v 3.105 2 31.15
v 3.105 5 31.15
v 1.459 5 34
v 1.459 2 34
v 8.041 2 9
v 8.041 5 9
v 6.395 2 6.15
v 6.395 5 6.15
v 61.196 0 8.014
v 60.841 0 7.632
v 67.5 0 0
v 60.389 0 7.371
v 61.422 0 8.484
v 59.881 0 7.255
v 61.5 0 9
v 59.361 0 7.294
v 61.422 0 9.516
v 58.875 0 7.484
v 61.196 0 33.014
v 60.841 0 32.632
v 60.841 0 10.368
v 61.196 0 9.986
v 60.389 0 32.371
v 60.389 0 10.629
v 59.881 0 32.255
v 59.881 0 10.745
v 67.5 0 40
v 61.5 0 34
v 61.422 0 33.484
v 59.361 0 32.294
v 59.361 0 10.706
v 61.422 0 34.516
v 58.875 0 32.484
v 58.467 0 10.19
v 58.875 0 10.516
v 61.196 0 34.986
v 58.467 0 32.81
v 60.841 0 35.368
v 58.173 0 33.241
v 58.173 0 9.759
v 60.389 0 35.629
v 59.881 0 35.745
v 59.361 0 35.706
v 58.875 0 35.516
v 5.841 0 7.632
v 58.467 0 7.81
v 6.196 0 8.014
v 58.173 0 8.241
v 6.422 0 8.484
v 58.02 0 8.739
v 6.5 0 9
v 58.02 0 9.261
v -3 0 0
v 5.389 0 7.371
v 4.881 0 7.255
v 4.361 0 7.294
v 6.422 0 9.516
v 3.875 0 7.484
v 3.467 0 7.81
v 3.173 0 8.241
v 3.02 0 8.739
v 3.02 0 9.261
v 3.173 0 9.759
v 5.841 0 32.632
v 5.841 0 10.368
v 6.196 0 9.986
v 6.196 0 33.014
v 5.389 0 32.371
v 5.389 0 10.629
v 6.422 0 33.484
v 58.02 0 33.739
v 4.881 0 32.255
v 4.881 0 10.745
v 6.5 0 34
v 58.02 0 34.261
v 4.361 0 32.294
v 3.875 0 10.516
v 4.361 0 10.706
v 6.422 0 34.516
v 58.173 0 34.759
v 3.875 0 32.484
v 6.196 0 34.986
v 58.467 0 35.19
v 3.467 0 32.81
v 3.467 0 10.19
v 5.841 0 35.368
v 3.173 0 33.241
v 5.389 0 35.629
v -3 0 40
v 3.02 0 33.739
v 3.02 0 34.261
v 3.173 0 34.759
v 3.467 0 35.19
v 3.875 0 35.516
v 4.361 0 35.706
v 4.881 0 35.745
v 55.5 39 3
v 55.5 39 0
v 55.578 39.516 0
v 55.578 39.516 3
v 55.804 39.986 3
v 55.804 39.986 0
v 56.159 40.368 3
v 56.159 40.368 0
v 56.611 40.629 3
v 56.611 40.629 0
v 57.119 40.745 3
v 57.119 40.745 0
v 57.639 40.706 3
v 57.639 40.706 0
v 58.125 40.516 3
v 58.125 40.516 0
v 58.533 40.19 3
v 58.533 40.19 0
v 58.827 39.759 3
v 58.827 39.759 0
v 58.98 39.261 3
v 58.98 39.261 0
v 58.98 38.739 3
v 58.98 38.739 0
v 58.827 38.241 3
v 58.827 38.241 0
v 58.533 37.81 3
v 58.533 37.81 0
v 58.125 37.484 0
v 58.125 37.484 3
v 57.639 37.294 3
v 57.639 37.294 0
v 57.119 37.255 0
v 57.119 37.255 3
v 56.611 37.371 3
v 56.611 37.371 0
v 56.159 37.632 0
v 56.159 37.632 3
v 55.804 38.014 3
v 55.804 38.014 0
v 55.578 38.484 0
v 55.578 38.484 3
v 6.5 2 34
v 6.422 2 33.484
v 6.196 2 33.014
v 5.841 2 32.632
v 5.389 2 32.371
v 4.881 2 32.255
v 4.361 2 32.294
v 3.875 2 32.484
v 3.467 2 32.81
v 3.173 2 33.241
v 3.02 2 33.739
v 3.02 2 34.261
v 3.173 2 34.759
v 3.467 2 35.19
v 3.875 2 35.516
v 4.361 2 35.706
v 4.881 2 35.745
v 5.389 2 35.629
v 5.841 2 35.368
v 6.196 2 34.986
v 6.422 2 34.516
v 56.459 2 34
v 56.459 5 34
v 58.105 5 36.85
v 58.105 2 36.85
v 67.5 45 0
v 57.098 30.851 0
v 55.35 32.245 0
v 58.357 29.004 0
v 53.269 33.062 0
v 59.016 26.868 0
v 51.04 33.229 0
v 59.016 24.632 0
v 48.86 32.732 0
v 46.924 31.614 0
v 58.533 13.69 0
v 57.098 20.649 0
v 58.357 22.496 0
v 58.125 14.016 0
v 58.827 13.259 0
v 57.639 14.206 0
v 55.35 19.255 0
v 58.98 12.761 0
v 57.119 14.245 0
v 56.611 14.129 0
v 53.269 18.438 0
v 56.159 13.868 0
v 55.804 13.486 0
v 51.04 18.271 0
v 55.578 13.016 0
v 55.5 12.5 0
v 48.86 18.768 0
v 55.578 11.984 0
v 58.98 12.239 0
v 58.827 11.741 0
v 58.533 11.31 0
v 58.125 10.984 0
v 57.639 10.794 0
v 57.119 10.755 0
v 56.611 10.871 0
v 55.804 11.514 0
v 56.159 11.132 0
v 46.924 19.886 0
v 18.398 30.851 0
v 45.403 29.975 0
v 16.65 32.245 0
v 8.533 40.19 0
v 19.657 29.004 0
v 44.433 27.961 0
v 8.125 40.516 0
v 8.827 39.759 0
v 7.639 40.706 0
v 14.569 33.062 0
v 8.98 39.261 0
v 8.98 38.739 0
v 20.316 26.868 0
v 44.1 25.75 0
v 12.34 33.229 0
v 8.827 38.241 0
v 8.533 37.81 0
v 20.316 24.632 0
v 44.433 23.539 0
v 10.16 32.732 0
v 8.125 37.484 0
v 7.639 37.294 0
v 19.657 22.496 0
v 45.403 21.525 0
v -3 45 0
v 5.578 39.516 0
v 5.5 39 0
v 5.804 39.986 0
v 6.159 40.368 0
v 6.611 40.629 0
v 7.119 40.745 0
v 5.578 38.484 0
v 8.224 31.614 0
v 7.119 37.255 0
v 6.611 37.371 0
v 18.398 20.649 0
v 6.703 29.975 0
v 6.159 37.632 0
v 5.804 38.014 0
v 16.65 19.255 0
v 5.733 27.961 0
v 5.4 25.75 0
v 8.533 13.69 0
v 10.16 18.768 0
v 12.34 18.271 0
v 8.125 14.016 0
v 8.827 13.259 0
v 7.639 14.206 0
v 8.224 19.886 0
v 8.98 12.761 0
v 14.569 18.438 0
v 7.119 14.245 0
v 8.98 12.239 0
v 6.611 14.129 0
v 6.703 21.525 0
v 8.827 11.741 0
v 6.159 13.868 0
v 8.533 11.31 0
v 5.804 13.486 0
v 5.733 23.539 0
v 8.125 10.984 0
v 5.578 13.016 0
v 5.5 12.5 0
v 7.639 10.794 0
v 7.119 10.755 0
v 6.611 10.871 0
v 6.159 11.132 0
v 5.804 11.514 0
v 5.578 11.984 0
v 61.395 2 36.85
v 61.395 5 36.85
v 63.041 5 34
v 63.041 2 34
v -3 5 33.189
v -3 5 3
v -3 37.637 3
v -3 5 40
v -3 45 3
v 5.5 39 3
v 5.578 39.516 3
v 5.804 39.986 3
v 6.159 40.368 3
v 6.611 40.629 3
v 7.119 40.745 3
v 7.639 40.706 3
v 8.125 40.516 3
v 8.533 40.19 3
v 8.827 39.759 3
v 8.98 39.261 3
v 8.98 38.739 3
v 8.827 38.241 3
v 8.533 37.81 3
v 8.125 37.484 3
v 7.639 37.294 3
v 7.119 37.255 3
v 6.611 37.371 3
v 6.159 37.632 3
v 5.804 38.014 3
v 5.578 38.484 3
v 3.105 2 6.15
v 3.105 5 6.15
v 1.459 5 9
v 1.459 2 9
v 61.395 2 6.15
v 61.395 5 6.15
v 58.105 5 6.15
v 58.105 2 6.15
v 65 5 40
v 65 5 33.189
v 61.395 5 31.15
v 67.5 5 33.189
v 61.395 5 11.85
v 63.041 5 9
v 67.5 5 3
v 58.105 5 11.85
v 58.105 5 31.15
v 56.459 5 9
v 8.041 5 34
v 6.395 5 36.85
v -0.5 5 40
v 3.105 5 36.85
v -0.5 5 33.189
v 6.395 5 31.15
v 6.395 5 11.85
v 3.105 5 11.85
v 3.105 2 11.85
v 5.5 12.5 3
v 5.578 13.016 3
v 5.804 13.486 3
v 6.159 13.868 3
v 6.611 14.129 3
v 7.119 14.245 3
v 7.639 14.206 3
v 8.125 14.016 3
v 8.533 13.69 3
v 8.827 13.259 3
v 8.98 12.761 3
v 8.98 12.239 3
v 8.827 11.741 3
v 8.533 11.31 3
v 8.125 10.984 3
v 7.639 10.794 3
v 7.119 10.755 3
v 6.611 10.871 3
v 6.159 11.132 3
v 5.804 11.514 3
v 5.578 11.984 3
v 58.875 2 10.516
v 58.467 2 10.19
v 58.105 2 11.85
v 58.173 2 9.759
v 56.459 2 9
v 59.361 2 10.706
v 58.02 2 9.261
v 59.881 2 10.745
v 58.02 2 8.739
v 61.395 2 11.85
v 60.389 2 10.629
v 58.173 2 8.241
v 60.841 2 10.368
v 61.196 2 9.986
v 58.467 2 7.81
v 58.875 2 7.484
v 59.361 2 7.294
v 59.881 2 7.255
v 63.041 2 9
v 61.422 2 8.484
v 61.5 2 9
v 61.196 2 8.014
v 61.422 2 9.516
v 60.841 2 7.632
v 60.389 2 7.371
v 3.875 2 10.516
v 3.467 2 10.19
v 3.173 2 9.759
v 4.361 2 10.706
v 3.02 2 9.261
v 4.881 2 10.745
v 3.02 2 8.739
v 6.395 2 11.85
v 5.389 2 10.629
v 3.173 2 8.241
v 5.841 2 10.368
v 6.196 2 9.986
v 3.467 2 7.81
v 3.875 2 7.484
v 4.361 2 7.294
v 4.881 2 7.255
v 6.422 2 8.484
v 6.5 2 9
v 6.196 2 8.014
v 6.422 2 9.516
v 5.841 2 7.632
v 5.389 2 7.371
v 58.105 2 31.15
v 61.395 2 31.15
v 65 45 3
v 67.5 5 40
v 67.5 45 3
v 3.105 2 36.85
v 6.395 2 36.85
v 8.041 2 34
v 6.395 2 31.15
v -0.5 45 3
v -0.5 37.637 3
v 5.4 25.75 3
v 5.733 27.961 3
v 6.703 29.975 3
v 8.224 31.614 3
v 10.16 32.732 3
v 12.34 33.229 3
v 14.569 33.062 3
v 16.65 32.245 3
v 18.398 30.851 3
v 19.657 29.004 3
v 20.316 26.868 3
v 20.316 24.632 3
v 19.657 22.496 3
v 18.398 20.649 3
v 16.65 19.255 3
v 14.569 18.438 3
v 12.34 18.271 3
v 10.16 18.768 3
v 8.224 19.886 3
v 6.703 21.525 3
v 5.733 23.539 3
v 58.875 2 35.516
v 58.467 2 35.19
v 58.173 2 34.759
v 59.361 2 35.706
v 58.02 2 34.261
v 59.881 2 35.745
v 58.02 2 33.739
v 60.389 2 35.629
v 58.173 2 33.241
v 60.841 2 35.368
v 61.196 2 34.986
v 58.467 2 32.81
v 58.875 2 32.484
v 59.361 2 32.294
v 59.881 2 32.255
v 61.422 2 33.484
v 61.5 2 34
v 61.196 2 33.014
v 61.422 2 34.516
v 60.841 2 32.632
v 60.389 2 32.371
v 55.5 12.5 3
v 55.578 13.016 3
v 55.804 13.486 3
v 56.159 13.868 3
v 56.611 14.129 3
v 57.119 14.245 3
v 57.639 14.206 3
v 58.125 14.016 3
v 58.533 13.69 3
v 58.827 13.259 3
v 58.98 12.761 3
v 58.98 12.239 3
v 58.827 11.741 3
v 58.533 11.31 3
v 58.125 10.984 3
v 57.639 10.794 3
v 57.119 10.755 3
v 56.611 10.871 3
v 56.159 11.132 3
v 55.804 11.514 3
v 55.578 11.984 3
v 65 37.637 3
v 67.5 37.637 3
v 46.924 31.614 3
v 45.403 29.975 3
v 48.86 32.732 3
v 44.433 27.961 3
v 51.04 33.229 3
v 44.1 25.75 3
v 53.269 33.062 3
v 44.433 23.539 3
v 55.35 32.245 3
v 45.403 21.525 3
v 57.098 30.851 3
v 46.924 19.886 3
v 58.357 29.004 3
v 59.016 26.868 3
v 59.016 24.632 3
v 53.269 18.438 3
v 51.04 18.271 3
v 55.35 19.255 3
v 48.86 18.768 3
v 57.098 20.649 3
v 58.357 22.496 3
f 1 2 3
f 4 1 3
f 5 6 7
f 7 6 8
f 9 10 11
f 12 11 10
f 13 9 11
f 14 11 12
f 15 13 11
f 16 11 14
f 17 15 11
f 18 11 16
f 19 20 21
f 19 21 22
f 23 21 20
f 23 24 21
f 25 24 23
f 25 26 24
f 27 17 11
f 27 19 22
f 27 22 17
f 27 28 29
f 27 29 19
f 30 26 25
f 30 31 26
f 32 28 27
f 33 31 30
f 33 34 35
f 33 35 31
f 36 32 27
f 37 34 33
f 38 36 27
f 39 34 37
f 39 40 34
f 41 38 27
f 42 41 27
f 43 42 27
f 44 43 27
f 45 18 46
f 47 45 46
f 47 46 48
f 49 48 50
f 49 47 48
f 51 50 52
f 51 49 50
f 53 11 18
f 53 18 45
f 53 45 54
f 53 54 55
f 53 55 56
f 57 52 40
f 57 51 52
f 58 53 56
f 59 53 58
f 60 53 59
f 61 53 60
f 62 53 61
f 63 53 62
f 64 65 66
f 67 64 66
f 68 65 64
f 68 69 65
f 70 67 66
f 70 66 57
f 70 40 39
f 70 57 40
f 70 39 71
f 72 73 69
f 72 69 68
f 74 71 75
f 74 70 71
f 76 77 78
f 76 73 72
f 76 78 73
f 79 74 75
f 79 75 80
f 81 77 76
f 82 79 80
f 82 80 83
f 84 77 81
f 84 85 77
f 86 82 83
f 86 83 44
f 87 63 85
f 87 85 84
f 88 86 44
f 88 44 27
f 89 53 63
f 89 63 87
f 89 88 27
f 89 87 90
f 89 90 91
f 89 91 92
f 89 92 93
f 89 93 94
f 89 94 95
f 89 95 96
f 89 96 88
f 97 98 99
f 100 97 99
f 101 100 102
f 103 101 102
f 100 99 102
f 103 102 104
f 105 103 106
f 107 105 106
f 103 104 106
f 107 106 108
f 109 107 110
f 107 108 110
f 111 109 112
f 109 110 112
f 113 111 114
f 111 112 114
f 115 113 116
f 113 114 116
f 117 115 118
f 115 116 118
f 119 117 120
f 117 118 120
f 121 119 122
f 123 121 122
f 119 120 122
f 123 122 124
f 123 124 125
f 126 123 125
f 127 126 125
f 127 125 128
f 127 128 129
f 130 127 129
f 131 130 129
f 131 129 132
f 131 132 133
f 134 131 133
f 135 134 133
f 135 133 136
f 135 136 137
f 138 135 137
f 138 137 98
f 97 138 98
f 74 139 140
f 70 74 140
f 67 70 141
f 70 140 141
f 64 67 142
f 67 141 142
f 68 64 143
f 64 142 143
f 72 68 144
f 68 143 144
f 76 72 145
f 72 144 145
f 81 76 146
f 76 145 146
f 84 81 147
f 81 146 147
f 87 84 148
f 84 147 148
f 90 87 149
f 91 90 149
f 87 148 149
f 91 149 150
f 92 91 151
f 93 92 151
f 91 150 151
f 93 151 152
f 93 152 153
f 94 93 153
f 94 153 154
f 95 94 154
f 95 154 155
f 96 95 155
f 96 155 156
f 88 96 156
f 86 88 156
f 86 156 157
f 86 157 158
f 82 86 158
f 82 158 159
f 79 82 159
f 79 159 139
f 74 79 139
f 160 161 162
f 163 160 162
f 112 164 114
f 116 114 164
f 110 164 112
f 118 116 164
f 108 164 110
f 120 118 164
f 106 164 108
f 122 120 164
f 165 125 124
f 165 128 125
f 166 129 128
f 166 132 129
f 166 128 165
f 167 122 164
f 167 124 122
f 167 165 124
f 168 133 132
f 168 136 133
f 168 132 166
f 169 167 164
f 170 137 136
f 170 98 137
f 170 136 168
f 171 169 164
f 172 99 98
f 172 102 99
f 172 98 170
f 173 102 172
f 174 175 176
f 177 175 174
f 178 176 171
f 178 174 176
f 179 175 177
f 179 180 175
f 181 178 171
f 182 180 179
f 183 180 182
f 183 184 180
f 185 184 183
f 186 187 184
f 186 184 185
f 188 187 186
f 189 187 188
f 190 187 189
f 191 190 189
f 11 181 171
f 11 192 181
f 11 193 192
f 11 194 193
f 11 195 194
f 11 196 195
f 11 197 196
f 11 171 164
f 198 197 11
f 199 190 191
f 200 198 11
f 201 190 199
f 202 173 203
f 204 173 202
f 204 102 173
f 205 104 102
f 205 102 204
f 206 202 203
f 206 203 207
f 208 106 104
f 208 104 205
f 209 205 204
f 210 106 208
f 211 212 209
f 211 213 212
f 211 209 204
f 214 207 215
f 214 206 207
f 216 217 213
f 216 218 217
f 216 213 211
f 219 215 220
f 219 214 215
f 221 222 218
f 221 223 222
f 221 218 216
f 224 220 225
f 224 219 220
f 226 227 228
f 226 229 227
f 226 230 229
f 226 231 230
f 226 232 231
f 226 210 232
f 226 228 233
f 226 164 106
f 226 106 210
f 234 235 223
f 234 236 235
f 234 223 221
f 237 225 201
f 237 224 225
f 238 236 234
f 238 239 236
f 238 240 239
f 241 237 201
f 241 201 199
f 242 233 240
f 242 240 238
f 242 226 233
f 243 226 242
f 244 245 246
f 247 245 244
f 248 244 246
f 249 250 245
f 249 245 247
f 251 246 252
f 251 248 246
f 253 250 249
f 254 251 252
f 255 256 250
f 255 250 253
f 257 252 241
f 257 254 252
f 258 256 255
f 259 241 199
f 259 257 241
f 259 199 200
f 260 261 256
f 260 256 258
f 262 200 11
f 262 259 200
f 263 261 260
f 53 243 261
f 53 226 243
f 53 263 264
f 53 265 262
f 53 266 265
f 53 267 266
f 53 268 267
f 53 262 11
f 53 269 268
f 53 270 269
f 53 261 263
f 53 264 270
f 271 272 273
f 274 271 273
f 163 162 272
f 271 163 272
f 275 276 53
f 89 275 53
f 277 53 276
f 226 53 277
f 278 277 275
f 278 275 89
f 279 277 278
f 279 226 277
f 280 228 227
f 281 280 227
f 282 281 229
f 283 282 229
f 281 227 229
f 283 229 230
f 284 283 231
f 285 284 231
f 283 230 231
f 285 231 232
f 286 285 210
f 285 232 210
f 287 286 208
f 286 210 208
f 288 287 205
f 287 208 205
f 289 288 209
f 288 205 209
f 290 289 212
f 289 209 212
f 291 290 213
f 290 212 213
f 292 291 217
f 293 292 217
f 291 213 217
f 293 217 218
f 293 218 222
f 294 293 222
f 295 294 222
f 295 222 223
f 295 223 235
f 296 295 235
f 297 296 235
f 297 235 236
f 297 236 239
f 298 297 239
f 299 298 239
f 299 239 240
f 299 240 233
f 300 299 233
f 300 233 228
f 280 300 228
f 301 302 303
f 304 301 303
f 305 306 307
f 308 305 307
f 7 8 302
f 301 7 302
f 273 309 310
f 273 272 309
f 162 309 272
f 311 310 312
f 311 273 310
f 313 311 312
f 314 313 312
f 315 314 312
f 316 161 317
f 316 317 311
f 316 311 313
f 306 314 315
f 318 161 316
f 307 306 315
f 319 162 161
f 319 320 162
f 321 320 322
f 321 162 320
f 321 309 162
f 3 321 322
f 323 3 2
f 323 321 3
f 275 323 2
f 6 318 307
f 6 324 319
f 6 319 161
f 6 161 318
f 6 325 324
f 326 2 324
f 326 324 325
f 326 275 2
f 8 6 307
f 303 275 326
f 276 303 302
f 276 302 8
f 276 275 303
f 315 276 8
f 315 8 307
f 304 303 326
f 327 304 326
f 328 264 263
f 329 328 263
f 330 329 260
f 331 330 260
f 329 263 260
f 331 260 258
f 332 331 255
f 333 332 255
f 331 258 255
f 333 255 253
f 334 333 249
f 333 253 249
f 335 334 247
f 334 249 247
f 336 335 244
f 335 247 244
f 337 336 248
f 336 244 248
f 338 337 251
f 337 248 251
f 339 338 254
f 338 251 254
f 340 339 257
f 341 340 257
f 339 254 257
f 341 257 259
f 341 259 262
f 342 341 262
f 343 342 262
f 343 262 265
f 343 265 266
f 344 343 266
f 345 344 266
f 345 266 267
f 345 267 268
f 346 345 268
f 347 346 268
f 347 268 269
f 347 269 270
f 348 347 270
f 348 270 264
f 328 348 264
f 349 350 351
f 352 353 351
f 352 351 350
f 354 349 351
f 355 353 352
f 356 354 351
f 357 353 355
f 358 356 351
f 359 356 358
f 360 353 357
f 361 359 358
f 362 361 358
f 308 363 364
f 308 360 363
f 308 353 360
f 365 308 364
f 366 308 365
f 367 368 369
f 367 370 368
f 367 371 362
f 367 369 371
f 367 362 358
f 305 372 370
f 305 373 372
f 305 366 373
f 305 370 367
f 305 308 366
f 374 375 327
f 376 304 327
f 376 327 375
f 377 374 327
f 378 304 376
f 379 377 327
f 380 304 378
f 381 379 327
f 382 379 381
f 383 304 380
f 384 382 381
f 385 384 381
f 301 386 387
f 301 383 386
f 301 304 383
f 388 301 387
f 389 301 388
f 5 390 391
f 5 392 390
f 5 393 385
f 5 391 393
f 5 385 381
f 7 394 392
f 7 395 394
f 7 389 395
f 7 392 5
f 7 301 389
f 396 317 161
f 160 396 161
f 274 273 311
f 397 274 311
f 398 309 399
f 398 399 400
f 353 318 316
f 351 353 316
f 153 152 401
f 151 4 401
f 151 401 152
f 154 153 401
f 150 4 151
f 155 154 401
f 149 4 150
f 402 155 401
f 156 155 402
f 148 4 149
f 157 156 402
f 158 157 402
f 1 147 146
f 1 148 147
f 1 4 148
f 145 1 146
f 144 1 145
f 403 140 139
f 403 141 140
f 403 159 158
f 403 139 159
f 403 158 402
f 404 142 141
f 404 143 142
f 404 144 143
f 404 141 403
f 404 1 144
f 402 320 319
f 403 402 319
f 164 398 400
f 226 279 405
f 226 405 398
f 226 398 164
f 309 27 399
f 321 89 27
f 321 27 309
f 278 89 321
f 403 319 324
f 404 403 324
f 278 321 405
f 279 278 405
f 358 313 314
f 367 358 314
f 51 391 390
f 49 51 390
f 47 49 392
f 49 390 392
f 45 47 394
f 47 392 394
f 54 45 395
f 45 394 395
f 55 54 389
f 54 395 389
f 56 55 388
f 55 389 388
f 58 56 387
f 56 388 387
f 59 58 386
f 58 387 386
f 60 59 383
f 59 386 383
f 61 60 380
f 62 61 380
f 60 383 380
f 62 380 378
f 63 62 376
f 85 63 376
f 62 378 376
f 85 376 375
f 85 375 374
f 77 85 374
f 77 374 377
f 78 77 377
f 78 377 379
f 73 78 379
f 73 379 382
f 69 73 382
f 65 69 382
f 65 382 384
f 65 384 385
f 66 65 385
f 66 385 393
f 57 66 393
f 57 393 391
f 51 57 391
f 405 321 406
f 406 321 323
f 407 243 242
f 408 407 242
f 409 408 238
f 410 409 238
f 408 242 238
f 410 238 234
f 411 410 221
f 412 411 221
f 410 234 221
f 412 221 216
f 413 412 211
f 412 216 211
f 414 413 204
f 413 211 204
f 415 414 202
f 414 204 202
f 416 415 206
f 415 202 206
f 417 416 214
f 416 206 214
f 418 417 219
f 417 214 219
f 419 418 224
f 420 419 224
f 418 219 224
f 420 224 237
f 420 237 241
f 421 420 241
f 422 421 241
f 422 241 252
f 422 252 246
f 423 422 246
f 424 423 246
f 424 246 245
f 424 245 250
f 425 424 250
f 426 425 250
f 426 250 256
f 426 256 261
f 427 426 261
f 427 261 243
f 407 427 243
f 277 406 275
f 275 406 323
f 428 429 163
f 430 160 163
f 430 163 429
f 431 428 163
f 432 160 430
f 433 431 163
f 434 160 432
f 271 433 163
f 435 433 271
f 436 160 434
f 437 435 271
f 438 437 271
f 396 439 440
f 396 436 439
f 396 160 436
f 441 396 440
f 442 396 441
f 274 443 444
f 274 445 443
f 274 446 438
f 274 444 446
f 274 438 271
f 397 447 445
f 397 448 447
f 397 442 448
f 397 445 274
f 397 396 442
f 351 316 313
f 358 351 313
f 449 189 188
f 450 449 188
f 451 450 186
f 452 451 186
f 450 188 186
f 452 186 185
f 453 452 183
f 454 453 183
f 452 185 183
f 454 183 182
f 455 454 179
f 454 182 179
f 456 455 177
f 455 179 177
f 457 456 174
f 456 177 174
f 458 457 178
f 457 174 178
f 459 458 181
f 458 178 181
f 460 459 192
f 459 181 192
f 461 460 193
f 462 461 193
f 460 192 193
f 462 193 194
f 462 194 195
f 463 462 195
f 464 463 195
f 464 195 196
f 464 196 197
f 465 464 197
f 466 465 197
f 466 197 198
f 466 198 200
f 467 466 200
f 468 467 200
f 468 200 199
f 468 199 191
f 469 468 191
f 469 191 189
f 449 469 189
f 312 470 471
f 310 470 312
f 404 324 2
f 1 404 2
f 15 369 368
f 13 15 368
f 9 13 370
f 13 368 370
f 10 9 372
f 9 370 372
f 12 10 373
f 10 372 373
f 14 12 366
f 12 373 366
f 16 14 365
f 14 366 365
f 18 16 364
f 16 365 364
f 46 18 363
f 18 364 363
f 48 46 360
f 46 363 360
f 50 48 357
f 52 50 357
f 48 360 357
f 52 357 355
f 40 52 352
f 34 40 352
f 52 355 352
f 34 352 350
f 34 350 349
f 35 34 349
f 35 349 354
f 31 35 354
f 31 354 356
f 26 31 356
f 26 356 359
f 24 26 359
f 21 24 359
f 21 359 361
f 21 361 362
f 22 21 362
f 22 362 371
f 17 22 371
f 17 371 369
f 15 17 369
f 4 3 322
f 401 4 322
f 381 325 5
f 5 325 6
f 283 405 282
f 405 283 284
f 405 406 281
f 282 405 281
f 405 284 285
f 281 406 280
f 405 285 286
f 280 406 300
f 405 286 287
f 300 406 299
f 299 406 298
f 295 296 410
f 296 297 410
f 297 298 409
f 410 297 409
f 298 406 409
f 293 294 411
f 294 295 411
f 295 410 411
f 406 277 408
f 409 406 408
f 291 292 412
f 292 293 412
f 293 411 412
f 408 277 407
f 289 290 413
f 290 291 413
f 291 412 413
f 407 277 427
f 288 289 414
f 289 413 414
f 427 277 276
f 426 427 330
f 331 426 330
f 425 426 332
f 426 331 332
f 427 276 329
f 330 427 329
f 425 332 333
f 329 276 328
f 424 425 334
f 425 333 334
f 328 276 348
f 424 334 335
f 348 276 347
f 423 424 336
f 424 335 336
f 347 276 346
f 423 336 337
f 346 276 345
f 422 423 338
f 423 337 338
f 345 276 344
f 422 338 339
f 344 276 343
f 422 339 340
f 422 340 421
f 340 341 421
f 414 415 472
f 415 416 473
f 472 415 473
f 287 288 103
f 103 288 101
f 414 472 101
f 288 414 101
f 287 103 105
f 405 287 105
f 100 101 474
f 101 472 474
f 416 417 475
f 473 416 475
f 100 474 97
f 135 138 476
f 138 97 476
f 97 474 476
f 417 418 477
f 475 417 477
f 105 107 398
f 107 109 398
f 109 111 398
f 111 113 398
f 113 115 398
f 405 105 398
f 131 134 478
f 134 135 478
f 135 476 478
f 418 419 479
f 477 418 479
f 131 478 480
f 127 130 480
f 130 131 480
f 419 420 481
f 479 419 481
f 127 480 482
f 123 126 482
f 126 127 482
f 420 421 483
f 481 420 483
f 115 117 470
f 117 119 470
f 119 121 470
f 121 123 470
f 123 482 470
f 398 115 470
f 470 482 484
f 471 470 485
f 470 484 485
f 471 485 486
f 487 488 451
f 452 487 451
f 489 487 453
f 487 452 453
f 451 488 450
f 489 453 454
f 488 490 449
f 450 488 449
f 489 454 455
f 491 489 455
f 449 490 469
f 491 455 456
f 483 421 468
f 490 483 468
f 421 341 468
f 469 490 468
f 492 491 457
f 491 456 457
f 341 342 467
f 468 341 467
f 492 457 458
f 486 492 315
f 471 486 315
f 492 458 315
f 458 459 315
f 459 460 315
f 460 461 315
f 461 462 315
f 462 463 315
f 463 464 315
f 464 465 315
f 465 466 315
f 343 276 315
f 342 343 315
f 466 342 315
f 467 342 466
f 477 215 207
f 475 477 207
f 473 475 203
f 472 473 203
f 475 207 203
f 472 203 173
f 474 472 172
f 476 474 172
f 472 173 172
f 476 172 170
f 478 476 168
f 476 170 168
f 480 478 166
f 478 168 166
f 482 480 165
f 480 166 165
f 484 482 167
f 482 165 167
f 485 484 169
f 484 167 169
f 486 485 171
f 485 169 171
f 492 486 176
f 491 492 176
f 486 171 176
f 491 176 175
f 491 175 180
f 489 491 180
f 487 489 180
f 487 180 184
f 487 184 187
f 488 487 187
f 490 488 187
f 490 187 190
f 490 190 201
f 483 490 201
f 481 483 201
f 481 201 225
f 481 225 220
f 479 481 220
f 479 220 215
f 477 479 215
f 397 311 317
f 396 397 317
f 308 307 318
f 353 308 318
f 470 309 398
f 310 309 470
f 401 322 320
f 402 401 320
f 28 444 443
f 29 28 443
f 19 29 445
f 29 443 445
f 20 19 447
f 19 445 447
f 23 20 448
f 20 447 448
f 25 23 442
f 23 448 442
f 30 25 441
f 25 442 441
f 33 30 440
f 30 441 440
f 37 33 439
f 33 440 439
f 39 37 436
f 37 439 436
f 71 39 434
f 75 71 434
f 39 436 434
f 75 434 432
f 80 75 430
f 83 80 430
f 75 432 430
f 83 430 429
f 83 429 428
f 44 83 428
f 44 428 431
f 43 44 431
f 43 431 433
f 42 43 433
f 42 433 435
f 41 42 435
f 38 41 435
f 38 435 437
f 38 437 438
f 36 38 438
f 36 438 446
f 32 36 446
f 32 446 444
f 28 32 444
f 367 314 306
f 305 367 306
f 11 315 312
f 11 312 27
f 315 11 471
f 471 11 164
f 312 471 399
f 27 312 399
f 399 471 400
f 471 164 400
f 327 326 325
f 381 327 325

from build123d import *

# Parameters (mm, degrees)
SKETCH_1_W          = 64.5
SKETCH_1_H          = 45
EXTRUDE_1_DEPTH     = 3
HOLE_WIZARD_1_D     = 3.5
HOLE_WIZARD_2_D     = 15
SKETCH_7_W          = 64.5
SKETCH_7_H          = 5
EXTRUDE_2_DEPTH     = 37
HOLE_WIZARD_3_D     = 3.5
CUT_EXTRUDE_1_DEPTH = 3
EXTRUDE_3_DEPTH     = 3
SKETCH_15_W         = 65.5
SKETCH_15_H         = 37
CUT_EXTRUDE_2_DEPTH = 40


with BuildPart() as part:
    # 草图1 → 凸台-拉伸1 (new body)
    with BuildSketch(Plane.XY):
        with Locations((32.25, 22.5)):
            Rectangle(SKETCH_1_W, SKETCH_1_H)
    extrude(amount=EXTRUDE_1_DEPTH)

    # 孔1 (through all)
    with Locations(Plane.XY.offset(3)):
        with Locations((7.25, 39), (57.25, 39), (57.25, 12.5), (7.25, 12.5)):
            Hole(HOLE_WIZARD_1_D / 2)

    # 孔2 (through all)
    with Locations(Plane.XY.offset(3)):
        with Locations((12.9, 25.75), (51.6, 25.75)):
            Hole(HOLE_WIZARD_2_D / 2)

    # 草图7 → 凸台-拉伸2 (add)
    with BuildSketch(Plane.XY.offset(3)):
        with Locations((32.25, 2.5)):
            Rectangle(SKETCH_7_W, SKETCH_7_H)
    extrude(amount=EXTRUDE_2_DEPTH)

    # 孔3 (through all)
    with Locations(Plane(origin=(0, 0, 0), x_dir=(-1, 0, 0), z_dir=(0, -1, 0))):
        with Locations((-4.75, -34), (-4.75, -9), (-59.75, -9), (-59.75, -34)):
            Hole(HOLE_WIZARD_3_D / 2)

    # 草图11 → 切除-拉伸1 (cut)
    with BuildSketch(Plane(origin=(0, 5, 0), x_dir=(1, 0, 0), z_dir=(0, 1, 0))):
        Polygon((63.040896534, -9), (61.395448267, -6.15), (58.104551733, -6.15), (56.459103466, -9), (58.104551733, -11.85), (61.395448267, -11.85), align=None)
        Polygon((63.040896534, -34), (61.395448267, -31.15), (58.104551733, -31.15), (56.459103466, -34), (58.104551733, -36.85), (61.395448267, -36.85), align=None)
        Polygon((8.040896534, -34), (6.395448267, -31.15), (3.104551733, -31.15), (1.459103466, -34), (3.104551733, -36.85), (6.395448267, -36.85), align=None)
        Polygon((8.040896534, -9), (6.395448267, -6.15), (3.104551733, -6.15), (1.459103466, -9), (3.104551733, -11.85), (6.395448267, -11.85), align=None)
    extrude(amount=-CUT_EXTRUDE_1_DEPTH, mode=Mode.SUBTRACT)

    # 草图14 → 凸台-拉伸3 (add)
    with BuildSketch(Plane.ZY):
        Polygon((3, 45), (0, 45), (0, 0), (40, 0), (40, 5), (33.188933637, 5), (3, 5), (3, 37.636685013), align=None)
        Polygon((40, 5), (3, 45), (3, 37.636685013), (33.188933637, 5), align=None)
    extrude_3 = extrude(amount=EXTRUDE_3_DEPTH)

    # 镜向1: 凸台-拉伸3 across plane
    add(extrude_3.mirror(Plane.ZY.offset(-32.25)))

    # 草图15 → 切除-拉伸2 (cut)
    with BuildSketch(Plane(origin=(0, 5, 0), x_dir=(1, 0, 0), z_dir=(0, 1, 0))):
        with Locations((32.25, -21.5)):
            Rectangle(SKETCH_15_W, SKETCH_15_H)
    extrude(amount=CUT_EXTRUDE_2_DEPTH, mode=Mode.SUBTRACT)


solid = part.part
